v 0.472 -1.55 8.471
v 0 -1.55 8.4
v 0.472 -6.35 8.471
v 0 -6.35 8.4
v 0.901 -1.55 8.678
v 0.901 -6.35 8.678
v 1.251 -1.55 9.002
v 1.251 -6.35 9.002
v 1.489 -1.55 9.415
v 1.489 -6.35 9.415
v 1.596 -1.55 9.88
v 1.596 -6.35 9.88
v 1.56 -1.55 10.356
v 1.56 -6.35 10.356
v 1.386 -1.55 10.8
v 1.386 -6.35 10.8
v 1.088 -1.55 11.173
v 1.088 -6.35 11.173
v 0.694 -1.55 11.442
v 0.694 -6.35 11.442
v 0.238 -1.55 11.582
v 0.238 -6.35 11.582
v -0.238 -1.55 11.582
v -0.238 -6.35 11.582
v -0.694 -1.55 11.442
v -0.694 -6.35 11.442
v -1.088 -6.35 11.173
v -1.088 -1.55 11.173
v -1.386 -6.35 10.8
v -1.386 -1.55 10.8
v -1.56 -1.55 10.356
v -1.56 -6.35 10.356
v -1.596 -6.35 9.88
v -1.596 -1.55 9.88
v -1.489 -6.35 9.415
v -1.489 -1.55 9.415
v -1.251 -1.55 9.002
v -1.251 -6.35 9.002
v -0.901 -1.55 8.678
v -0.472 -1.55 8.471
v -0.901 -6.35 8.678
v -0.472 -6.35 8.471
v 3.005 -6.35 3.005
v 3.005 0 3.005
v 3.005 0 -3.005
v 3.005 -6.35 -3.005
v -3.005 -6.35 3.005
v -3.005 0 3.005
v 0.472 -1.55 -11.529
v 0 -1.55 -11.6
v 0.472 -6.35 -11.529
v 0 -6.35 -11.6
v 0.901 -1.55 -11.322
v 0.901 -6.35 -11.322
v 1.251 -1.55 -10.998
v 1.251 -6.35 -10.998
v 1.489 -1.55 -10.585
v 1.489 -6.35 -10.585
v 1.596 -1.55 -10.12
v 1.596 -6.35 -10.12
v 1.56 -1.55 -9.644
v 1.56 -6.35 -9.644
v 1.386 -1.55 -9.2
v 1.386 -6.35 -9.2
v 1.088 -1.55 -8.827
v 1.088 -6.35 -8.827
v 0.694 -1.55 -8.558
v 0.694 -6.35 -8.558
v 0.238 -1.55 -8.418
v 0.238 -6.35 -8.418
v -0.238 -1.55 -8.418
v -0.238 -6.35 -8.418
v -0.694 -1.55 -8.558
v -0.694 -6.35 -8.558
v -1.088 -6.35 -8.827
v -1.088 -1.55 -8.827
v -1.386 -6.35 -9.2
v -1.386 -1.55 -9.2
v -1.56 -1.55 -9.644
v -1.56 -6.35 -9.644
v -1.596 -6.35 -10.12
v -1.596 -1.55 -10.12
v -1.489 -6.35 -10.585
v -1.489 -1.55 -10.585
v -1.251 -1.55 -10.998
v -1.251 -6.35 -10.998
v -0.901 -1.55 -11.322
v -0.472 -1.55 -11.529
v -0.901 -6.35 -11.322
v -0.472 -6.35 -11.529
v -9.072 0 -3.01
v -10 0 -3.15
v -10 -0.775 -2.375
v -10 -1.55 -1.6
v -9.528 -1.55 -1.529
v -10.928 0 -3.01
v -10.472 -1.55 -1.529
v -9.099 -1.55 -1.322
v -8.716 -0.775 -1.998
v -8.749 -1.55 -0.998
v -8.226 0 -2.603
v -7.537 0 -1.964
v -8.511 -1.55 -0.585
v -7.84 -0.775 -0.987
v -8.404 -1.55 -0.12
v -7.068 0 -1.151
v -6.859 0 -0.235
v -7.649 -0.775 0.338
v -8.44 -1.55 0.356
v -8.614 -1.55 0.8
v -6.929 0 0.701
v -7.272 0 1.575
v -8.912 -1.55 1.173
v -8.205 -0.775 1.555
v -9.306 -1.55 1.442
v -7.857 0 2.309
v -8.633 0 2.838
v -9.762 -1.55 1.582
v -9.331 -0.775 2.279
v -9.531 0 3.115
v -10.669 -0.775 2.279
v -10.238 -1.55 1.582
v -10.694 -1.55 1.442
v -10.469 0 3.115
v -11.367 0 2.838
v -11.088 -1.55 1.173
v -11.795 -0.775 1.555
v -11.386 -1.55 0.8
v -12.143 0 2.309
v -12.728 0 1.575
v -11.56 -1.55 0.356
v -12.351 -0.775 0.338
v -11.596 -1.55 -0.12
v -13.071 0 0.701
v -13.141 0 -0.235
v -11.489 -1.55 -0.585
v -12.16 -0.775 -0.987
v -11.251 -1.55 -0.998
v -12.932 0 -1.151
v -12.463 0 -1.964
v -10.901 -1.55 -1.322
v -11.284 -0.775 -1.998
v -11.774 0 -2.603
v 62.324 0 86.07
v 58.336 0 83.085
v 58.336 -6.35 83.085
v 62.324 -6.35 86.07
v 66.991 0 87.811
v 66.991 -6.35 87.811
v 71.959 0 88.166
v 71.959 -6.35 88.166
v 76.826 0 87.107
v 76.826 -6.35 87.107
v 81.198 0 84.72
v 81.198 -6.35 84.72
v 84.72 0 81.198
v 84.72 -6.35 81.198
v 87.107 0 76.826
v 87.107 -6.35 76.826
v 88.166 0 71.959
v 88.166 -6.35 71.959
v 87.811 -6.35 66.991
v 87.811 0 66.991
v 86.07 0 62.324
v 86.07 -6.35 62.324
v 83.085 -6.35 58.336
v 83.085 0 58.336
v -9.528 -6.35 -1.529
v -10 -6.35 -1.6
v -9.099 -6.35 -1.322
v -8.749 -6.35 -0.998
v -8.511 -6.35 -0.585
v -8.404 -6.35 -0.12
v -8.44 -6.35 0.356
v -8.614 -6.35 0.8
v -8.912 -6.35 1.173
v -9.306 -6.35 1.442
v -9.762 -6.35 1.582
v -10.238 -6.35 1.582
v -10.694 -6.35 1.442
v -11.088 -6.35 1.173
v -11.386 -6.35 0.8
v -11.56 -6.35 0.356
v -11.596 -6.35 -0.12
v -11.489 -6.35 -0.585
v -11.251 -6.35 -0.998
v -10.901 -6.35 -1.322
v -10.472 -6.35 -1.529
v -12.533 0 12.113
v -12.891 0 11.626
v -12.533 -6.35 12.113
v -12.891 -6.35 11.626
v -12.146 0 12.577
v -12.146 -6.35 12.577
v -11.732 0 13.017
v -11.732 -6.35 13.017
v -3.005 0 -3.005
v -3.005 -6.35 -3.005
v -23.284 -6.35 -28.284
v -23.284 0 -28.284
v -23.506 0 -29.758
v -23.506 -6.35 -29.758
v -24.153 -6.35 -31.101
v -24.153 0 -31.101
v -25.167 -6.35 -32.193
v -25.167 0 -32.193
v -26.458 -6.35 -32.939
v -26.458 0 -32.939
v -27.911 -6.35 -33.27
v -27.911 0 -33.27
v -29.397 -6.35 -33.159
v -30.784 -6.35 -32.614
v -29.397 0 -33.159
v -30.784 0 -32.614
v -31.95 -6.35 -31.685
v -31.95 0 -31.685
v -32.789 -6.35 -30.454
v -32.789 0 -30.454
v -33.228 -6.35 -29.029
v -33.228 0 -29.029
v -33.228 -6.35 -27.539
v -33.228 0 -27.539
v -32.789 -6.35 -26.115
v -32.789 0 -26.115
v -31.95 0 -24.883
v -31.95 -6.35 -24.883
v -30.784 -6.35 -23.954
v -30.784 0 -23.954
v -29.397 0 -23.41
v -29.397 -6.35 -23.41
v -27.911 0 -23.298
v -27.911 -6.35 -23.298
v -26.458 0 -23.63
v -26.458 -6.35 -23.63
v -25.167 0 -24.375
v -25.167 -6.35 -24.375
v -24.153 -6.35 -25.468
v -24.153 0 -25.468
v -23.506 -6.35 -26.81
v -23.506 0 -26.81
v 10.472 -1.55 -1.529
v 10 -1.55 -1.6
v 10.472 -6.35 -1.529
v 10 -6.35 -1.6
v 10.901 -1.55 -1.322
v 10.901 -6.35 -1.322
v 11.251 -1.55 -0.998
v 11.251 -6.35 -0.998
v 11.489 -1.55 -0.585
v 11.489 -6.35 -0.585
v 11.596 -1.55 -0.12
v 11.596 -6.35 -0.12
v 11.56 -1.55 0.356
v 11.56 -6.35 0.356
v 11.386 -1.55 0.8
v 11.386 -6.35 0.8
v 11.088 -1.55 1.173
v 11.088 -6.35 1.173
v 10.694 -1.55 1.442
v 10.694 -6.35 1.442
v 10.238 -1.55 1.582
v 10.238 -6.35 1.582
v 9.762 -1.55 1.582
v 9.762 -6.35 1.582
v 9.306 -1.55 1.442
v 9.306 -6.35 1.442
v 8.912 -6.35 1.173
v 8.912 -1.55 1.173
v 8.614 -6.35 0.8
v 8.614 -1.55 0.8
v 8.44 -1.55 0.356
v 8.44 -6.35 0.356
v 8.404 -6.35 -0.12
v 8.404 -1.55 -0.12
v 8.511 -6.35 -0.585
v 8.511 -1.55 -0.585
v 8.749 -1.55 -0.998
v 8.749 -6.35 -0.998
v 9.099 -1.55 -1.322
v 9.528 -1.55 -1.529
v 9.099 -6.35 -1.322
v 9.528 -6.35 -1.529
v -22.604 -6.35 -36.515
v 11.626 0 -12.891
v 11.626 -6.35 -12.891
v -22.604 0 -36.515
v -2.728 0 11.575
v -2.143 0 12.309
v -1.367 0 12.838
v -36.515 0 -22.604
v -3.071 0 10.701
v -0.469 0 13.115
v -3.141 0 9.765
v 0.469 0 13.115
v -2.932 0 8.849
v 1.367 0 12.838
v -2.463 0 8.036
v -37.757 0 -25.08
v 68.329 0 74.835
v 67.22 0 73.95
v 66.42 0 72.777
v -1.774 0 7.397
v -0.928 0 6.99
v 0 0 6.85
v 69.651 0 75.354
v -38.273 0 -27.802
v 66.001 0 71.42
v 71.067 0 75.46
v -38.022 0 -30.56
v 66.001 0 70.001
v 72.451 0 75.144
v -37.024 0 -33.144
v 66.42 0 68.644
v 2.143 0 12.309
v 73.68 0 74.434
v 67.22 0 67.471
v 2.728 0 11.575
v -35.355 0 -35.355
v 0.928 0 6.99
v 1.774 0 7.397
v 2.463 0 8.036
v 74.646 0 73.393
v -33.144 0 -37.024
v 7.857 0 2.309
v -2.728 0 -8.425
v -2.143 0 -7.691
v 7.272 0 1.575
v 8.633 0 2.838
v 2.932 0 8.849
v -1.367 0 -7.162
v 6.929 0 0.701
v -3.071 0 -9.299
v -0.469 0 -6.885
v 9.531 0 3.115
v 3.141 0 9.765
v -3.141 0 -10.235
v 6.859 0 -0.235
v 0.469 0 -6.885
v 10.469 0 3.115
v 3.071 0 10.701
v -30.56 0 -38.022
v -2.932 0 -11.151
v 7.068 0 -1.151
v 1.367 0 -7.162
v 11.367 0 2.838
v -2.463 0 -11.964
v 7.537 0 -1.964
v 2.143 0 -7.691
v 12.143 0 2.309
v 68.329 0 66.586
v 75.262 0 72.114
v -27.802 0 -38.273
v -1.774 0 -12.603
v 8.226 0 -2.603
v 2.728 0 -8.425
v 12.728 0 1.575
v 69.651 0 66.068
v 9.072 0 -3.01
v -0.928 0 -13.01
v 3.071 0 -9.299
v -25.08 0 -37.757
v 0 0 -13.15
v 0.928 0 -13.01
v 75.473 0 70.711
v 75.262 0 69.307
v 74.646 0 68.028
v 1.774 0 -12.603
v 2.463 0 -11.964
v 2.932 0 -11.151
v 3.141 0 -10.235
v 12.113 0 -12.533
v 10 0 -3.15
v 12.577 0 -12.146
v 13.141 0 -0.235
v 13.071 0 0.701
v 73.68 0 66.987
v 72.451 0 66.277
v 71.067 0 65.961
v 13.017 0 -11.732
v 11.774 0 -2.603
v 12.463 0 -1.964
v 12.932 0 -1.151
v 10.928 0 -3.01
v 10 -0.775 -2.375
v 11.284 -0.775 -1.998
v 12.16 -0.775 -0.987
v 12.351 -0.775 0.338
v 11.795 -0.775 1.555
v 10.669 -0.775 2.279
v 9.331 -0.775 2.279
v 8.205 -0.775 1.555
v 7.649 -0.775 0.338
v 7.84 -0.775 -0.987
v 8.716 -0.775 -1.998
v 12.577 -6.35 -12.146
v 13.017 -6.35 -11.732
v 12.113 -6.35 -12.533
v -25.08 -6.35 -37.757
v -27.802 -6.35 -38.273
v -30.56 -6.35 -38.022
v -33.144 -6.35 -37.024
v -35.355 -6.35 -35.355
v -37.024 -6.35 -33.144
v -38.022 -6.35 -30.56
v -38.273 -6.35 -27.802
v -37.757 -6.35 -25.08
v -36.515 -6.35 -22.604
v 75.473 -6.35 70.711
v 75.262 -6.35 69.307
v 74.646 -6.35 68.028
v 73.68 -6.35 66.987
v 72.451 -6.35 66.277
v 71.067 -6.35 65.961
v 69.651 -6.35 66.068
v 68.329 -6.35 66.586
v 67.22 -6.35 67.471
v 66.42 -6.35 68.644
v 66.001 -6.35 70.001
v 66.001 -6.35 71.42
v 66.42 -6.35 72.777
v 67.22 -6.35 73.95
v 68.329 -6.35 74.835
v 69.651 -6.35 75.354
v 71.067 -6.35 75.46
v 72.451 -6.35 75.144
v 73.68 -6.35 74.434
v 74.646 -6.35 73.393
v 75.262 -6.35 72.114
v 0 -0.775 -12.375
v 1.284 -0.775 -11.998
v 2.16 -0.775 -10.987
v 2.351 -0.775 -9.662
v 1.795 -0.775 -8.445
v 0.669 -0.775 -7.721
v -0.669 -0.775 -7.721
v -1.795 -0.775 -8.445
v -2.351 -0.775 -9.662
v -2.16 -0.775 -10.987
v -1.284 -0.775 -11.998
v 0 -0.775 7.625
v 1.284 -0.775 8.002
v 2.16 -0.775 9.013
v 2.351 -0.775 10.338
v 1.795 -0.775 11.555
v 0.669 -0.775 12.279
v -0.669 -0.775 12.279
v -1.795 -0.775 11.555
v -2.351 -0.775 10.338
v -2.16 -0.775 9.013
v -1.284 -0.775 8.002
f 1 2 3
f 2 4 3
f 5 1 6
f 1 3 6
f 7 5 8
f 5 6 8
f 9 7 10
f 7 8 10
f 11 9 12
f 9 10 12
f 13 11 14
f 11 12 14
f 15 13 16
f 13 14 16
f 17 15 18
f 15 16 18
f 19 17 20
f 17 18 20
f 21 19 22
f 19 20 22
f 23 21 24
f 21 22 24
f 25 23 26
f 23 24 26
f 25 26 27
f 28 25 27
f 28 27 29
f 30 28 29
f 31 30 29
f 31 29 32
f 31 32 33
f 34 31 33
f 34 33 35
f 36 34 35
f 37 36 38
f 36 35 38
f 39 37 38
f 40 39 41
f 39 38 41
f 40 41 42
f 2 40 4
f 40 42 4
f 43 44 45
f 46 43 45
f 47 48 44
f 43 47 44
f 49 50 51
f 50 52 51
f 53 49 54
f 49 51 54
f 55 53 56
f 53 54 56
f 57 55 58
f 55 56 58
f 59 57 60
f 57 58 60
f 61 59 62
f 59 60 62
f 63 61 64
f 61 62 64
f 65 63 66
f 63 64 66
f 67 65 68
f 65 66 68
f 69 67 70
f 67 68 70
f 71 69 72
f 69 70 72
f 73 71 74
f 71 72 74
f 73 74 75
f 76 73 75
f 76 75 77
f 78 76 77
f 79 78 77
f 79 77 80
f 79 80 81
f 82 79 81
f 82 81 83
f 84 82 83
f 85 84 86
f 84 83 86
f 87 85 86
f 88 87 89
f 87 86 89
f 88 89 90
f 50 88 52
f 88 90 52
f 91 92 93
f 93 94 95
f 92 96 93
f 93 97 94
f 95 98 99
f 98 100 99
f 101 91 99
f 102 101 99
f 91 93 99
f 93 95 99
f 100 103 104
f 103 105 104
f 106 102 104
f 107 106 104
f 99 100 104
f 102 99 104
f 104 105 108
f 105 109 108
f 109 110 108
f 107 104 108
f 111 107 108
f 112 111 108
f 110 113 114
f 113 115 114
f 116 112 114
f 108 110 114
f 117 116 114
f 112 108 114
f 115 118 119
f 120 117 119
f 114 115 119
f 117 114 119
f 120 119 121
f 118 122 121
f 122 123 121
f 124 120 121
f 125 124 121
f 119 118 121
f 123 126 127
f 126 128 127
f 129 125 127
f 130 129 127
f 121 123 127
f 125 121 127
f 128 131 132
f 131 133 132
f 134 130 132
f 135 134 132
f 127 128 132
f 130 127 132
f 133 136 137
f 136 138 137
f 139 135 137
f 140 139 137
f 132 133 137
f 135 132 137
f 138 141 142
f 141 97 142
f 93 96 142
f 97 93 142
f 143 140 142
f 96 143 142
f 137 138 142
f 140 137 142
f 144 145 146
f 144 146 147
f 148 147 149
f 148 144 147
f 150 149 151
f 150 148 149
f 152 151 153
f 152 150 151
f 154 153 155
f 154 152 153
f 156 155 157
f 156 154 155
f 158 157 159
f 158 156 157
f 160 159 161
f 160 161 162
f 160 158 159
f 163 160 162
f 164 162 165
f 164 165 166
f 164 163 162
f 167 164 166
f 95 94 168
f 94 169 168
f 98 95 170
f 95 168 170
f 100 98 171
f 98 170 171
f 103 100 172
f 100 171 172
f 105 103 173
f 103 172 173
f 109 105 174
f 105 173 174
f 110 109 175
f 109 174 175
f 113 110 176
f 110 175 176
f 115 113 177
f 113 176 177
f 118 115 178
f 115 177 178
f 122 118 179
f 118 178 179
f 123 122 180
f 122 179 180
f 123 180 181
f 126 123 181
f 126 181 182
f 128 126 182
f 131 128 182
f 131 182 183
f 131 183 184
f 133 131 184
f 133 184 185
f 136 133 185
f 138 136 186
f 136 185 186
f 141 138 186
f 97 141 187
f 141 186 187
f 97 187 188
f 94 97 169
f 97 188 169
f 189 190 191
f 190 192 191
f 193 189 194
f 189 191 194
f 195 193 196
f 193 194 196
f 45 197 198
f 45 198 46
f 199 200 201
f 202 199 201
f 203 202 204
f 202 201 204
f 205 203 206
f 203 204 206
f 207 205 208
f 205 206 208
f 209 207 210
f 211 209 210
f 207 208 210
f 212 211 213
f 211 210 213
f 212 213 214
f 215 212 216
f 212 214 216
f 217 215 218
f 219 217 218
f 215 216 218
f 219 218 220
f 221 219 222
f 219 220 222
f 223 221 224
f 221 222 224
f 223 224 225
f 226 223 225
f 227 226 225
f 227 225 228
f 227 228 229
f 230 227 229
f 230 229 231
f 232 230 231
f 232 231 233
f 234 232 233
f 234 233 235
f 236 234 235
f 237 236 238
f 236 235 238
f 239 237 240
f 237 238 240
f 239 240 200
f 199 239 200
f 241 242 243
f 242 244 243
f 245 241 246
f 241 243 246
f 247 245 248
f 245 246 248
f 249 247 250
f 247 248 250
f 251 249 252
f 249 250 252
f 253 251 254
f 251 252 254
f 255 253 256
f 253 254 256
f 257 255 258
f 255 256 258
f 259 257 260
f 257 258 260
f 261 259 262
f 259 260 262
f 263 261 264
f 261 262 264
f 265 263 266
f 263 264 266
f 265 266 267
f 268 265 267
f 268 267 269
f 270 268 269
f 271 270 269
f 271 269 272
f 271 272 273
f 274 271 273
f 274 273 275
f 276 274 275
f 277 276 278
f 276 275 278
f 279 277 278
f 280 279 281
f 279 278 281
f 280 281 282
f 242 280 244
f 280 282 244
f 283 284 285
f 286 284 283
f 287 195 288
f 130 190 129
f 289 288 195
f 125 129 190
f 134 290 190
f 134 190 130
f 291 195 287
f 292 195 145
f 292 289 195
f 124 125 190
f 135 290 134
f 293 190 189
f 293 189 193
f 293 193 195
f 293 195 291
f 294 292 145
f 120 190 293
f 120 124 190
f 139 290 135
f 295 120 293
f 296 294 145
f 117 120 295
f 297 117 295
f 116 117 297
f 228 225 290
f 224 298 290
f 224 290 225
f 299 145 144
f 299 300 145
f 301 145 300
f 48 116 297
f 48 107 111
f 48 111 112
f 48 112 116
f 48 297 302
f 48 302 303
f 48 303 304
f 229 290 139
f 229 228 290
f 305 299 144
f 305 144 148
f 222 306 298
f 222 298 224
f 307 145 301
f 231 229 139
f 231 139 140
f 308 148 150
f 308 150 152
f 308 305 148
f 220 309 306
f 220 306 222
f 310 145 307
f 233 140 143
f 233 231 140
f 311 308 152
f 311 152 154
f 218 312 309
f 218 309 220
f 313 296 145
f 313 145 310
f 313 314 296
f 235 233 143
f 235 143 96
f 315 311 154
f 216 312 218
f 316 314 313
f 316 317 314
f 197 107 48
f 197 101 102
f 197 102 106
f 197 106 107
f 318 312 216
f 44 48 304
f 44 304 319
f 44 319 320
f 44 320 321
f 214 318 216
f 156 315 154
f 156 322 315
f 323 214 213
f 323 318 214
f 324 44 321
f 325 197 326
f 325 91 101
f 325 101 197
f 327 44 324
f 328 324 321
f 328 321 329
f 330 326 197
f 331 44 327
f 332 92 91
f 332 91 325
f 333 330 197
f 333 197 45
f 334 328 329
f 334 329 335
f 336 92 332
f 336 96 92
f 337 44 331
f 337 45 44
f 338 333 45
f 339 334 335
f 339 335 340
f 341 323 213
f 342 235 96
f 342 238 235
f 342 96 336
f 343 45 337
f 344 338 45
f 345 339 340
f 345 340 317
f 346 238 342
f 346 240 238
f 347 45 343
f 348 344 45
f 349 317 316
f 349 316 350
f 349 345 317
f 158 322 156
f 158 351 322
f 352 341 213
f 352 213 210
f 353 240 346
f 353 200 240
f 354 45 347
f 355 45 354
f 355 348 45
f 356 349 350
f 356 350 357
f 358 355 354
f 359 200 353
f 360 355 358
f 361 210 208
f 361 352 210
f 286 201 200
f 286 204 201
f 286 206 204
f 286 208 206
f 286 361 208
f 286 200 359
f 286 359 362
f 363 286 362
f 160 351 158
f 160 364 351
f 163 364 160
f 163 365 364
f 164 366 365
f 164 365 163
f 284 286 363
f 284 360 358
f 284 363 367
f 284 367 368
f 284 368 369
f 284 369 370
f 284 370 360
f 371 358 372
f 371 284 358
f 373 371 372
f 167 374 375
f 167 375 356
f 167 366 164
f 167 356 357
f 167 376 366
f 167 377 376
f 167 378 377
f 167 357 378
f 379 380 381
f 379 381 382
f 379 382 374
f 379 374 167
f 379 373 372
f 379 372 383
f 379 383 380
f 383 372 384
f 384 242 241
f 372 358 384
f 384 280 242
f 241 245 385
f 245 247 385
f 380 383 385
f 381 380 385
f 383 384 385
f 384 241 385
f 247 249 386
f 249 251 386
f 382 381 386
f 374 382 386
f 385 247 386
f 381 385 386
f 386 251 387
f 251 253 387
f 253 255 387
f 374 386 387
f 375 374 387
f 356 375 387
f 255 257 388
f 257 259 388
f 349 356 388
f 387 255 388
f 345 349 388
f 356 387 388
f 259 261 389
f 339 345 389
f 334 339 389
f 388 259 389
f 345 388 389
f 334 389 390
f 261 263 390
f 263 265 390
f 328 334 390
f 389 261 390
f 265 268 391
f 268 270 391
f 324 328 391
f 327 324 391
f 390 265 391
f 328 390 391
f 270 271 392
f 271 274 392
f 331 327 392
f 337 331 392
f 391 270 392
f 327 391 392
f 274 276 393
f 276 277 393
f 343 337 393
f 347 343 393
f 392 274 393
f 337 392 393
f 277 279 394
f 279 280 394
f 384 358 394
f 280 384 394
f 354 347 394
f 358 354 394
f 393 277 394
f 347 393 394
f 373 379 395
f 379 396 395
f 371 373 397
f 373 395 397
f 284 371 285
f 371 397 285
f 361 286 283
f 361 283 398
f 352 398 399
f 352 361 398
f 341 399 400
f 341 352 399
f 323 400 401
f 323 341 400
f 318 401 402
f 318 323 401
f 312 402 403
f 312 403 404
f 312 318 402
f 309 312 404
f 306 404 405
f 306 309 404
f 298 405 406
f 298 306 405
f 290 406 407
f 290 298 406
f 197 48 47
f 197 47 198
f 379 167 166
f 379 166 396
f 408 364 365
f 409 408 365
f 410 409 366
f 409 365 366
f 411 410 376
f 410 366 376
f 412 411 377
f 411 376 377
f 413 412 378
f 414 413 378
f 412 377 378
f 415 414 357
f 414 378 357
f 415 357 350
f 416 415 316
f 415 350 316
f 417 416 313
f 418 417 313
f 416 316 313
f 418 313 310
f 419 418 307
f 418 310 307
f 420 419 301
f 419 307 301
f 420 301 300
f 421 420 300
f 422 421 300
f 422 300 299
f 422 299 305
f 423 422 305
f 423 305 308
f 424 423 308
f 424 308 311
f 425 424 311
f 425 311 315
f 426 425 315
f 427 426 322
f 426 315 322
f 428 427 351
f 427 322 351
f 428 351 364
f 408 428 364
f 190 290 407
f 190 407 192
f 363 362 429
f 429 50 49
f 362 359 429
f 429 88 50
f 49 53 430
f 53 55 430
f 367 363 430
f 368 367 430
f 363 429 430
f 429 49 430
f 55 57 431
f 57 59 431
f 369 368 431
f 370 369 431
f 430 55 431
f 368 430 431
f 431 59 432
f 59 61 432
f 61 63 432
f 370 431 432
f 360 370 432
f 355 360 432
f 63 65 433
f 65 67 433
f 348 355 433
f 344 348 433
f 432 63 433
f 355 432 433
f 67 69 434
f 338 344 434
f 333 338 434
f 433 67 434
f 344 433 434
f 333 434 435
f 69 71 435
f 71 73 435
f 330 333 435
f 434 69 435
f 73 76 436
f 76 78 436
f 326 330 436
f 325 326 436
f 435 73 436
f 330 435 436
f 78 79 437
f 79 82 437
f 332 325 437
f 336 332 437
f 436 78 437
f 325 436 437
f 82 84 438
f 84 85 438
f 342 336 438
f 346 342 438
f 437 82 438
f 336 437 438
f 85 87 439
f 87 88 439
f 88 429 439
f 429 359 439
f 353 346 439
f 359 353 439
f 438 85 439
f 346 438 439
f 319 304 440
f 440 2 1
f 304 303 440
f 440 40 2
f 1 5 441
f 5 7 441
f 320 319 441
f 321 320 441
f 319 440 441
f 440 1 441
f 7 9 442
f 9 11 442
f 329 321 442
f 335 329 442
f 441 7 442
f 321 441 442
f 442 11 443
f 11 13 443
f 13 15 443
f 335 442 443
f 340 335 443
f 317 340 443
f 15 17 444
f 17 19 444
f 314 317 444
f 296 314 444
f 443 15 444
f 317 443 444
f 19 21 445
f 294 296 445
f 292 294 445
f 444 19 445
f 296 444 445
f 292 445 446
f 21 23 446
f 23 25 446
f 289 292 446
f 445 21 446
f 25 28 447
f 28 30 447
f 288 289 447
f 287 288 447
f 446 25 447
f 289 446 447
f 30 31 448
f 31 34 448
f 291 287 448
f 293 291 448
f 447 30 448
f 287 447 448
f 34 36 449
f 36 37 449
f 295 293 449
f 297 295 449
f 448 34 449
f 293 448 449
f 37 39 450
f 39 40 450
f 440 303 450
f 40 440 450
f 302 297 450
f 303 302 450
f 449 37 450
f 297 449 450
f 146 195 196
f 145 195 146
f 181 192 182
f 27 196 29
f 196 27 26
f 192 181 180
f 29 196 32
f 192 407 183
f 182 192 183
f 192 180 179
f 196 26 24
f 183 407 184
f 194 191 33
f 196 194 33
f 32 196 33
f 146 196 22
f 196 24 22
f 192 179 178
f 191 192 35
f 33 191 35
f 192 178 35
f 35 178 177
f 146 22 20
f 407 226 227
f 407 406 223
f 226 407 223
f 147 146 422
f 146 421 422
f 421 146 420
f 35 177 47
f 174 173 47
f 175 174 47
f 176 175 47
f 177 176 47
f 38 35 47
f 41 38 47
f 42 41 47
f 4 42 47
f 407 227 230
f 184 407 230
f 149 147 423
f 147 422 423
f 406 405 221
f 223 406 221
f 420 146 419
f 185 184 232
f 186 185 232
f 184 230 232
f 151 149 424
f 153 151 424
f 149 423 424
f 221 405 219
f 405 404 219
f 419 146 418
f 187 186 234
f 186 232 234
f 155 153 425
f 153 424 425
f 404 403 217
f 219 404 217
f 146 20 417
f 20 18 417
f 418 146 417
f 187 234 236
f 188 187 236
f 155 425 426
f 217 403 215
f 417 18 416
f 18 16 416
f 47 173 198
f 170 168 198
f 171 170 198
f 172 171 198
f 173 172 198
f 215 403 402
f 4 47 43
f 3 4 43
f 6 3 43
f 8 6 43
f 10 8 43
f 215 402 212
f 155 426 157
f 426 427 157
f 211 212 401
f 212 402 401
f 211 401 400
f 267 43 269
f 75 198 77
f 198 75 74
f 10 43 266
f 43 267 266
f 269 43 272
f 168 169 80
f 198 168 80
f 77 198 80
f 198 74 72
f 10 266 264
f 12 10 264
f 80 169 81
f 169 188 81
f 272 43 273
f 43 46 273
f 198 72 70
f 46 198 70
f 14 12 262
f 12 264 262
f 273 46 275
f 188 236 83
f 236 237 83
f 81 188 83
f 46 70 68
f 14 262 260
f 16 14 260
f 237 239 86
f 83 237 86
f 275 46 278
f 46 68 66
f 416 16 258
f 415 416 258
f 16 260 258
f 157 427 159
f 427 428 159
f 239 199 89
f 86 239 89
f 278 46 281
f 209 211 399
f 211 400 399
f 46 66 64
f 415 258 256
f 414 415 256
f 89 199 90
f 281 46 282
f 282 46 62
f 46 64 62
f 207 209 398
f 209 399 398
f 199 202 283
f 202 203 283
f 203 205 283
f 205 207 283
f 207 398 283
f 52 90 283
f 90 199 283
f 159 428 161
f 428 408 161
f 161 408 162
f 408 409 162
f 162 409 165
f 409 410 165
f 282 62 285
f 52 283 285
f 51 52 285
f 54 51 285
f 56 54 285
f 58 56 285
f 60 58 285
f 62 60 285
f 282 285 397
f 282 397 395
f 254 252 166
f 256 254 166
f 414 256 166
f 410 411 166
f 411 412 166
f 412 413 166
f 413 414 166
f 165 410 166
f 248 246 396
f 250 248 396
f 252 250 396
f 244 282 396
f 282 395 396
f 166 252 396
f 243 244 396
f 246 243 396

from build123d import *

# Parameters (mm, degrees)
SKETCH2_R                                       = 4.7625
SKETCH2_W                                       = 6.01
SKETCH2_H                                       = 6.01
SKETCH2_R_2                                     = 5
BOSS_EXTRUDE1_DEPTH                             = 6.35
CSK_FOR_M3_FLAT_HEAD_MACHINE_SCREW1_D           = 3.2
CSK_FOR_M3_FLAT_HEAD_MACHINE_SCREW1_CSINK_D     = 6.3
CSK_FOR_M3_FLAT_HEAD_MACHINE_SCREW1_CSINK_ANGLE = 90
FILLET1_R                                       = 10


with BuildPart() as part:
    # Sketch2 → Boss-Extrude1 (new body)
    with BuildSketch(Plane(origin=(0, 0, 0), x_dir=(1, 0, 0), z_dir=(0, 1, 0))):
        with BuildLine():
            Line((83.085046789, -58.336309448), (12.374368671, 12.374368671))
            Line((12.374368671, 12.374368671), (-22.604233169, 36.514530504))
            ThreePointArc((-22.604233169, 36.514530504), (-35.355339059, 35.355339059), (-36.514530504, 22.604233169))
            Line((-36.514530504, 22.604233169), (-12.374368671, -12.374368671))
            Line((-12.374368671, -12.374368671), (58.336309448, -83.085046789))
            ThreePointArc((58.336309448, -83.085046789), (83.085046789, -83.085046789), (83.085046789, -58.336309448))
        make_face()
        with Locations((70.710678119, -70.710678119)):
            Circle(SKETCH2_R, mode=Mode.SUBTRACT)
        Rectangle(SKETCH2_W, SKETCH2_H, mode=Mode.SUBTRACT)
        with Locations((-28.284271247, 28.284271247)):
            Circle(SKETCH2_R_2, mode=Mode.SUBTRACT)
    extrude(amount=-BOSS_EXTRUDE1_DEPTH)

    # CSK for M3 Flat Head Machine Screw1 (through all)
    with Locations(Plane(origin=(0, 0, -10), x_dir=(0, 0, 1), z_dir=(0, 1, 0))):
        with Locations((0, 0), (10, -10), (10, 10), (20, 0)):
            CounterSinkHole(CSK_FOR_M3_FLAT_HEAD_MACHINE_SCREW1_D / 2, CSK_FOR_M3_FLAT_HEAD_MACHINE_SCREW1_CSINK_D / 2, counter_sink_angle=CSK_FOR_M3_FLAT_HEAD_MACHINE_SCREW1_CSINK_ANGLE)

    # Fillet1
    fillet1_edges = [part.edges().sort_by_distance(p)[0] for p in [
        (12.374368671, -3.175, -12.374368671),
        (-12.374368671, -3.175, 12.374368671),
    ]]
    fillet(fillet1_edges, radius=FILLET1_R)


solid = part.part
